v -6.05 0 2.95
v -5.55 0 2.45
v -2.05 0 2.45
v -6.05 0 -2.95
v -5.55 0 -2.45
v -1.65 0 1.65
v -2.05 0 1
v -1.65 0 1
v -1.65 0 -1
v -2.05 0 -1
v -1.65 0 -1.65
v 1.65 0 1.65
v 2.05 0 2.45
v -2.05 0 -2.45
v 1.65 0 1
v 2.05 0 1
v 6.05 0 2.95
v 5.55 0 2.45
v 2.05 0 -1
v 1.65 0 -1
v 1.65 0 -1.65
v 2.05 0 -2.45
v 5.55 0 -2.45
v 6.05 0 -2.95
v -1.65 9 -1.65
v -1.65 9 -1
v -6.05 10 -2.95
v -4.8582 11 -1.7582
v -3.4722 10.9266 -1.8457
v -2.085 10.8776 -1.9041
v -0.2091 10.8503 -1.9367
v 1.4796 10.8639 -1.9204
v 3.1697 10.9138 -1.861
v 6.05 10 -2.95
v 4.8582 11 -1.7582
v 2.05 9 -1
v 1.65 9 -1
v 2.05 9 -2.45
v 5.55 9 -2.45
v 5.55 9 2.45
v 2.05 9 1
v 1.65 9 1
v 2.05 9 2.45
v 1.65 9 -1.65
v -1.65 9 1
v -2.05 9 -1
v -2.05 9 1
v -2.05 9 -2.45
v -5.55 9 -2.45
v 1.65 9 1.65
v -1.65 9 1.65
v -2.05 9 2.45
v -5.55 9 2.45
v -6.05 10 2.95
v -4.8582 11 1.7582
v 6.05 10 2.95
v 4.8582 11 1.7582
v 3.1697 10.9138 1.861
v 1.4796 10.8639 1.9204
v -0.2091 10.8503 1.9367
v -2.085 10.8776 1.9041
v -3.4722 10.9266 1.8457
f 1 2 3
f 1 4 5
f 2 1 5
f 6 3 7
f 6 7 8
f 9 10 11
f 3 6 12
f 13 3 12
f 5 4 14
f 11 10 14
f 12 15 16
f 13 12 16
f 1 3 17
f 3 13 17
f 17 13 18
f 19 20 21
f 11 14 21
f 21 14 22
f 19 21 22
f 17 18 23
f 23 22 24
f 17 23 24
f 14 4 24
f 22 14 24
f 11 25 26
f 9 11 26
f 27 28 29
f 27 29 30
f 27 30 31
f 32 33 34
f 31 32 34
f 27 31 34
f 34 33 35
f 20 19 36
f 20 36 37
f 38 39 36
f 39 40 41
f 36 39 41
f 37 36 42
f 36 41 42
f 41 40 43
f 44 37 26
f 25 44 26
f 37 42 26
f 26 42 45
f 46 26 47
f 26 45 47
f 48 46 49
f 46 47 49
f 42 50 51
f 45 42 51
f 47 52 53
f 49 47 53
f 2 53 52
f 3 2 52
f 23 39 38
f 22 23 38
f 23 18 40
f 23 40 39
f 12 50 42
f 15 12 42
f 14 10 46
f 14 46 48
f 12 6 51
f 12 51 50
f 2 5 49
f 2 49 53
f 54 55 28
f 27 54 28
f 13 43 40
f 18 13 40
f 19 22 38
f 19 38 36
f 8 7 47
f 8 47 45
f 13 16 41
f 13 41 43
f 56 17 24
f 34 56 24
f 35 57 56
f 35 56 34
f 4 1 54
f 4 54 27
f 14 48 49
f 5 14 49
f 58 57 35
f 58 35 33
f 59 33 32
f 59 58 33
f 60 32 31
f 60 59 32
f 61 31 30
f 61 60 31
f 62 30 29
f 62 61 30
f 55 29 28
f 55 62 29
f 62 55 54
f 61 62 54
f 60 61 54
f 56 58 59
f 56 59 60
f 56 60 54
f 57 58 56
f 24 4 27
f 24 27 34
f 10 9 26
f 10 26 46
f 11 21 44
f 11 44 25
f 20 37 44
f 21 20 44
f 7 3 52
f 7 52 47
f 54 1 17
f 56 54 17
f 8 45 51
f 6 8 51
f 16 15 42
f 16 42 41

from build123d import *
from OCP.BRepFilletAPI import BRepFilletAPI_MakeChamfer

# Parameters (mm, degrees)
SKETCH1_W           = 12.1
SKETCH1_H           = 5.9
BOSS_EXTRUDE1_DEPTH = 11
CHAMFER1_SIZE       = 1
CHAMFER1_SIZE2      = 1.191753593
CUT_EXTRUDE3_DEPTH  = 14.871283286
CUT_EXTRUDE4_DEPTH  = 9


with BuildPart() as part:
    # Sketch1 → Boss-Extrude1 (new body)
    with BuildSketch(Plane(origin=(0, 0, 0), x_dir=(1, 0, 0), z_dir=(0, 1, 0))):
        Rectangle(SKETCH1_W, SKETCH1_H)
    extrude(amount=BOSS_EXTRUDE1_DEPTH)

    # Chamfer1: one chamfer whose edges measure the first distance from different faces: ONE call of the kernel's chamfer builder (chamfer() names one face for all edges)
    chamfer1_edges_1 = [part.edges().sort_by_distance(p)[0] for p in [
        (6.05, 11, 0),
    ]]
    chamfer1_side_1 = [part.faces().sort_by_distance(p)[0] for p in [
        (6.05, 5.5, 0),
    ]]
    chamfer1_edges_2 = [part.edges().sort_by_distance(p)[0] for p in [
        (0, 11, -2.95),
    ]]
    chamfer1_side_2 = [part.faces().sort_by_distance(p)[0] for p in [
        (0, 5.5, -2.95),
    ]]
    chamfer1_edges_3 = [part.edges().sort_by_distance(p)[0] for p in [
        (-6.05, 11, 0),
    ]]
    chamfer1_side_3 = [part.faces().sort_by_distance(p)[0] for p in [
        (-6.05, 5.5, 0),
    ]]
    chamfer1_edges_4 = [part.edges().sort_by_distance(p)[0] for p in [
        (0, 11, 2.95),
    ]]
    chamfer1_side_4 = [part.faces().sort_by_distance(p)[0] for p in [
        (0, 5.5, 2.95),
    ]]
    chamfer1 = BRepFilletAPI_MakeChamfer(part.part.solid().wrapped)
    for e in chamfer1_edges_1:
        chamfer1.Add(CHAMFER1_SIZE, CHAMFER1_SIZE2, e.wrapped, chamfer1_side_1[0].wrapped)  # the first distance lies on this face
    for e in chamfer1_edges_2:
        chamfer1.Add(CHAMFER1_SIZE, CHAMFER1_SIZE2, e.wrapped, chamfer1_side_2[0].wrapped)  # the first distance lies on this face
    for e in chamfer1_edges_3:
        chamfer1.Add(CHAMFER1_SIZE, CHAMFER1_SIZE2, e.wrapped, chamfer1_side_3[0].wrapped)  # the first distance lies on this face
    for e in chamfer1_edges_4:
        chamfer1.Add(CHAMFER1_SIZE, CHAMFER1_SIZE2, e.wrapped, chamfer1_side_4[0].wrapped)  # the first distance lies on this face
    add(Compound.cast(chamfer1.Shape()), mode=Mode.REPLACE)

    # Sketch6 → Cut-Extrude3 (cut, through all)
    with BuildSketch(Plane.XY.offset(2.95)):
        with BuildLine():
            Line((-4.858246407, 11), (4.858246407, 11))
            ThreePointArc((4.858246407, 11), (0, 10.85), (-4.858246407, 11))
        make_face()
    extrude(amount=-CUT_EXTRUDE3_DEPTH, mode=Mode.SUBTRACT)

    # Sketch7 → Cut-Extrude4 (cut)
    with BuildSketch(Plane.XZ):
        Polygon((-2.05, -1), (-2.05, -2.45), (-5.55, -2.45), (-5.55, 2.45), (-2.05, 2.45), (-2.05, 1), (-1.65, 1), (-1.65, 1.65), (1.65, 1.65), (1.65, 1), (2.05, 1), (2.05, 2.45), (5.55, 2.45), (5.55, -2.45), (2.05, -2.45), (2.05, -1), (1.65, -1), (1.65, -1.65), (-1.65, -1.65), (-1.65, -1), align=None)
    extrude(amount=-CUT_EXTRUDE4_DEPTH, mode=Mode.SUBTRACT)


solid = part.part
